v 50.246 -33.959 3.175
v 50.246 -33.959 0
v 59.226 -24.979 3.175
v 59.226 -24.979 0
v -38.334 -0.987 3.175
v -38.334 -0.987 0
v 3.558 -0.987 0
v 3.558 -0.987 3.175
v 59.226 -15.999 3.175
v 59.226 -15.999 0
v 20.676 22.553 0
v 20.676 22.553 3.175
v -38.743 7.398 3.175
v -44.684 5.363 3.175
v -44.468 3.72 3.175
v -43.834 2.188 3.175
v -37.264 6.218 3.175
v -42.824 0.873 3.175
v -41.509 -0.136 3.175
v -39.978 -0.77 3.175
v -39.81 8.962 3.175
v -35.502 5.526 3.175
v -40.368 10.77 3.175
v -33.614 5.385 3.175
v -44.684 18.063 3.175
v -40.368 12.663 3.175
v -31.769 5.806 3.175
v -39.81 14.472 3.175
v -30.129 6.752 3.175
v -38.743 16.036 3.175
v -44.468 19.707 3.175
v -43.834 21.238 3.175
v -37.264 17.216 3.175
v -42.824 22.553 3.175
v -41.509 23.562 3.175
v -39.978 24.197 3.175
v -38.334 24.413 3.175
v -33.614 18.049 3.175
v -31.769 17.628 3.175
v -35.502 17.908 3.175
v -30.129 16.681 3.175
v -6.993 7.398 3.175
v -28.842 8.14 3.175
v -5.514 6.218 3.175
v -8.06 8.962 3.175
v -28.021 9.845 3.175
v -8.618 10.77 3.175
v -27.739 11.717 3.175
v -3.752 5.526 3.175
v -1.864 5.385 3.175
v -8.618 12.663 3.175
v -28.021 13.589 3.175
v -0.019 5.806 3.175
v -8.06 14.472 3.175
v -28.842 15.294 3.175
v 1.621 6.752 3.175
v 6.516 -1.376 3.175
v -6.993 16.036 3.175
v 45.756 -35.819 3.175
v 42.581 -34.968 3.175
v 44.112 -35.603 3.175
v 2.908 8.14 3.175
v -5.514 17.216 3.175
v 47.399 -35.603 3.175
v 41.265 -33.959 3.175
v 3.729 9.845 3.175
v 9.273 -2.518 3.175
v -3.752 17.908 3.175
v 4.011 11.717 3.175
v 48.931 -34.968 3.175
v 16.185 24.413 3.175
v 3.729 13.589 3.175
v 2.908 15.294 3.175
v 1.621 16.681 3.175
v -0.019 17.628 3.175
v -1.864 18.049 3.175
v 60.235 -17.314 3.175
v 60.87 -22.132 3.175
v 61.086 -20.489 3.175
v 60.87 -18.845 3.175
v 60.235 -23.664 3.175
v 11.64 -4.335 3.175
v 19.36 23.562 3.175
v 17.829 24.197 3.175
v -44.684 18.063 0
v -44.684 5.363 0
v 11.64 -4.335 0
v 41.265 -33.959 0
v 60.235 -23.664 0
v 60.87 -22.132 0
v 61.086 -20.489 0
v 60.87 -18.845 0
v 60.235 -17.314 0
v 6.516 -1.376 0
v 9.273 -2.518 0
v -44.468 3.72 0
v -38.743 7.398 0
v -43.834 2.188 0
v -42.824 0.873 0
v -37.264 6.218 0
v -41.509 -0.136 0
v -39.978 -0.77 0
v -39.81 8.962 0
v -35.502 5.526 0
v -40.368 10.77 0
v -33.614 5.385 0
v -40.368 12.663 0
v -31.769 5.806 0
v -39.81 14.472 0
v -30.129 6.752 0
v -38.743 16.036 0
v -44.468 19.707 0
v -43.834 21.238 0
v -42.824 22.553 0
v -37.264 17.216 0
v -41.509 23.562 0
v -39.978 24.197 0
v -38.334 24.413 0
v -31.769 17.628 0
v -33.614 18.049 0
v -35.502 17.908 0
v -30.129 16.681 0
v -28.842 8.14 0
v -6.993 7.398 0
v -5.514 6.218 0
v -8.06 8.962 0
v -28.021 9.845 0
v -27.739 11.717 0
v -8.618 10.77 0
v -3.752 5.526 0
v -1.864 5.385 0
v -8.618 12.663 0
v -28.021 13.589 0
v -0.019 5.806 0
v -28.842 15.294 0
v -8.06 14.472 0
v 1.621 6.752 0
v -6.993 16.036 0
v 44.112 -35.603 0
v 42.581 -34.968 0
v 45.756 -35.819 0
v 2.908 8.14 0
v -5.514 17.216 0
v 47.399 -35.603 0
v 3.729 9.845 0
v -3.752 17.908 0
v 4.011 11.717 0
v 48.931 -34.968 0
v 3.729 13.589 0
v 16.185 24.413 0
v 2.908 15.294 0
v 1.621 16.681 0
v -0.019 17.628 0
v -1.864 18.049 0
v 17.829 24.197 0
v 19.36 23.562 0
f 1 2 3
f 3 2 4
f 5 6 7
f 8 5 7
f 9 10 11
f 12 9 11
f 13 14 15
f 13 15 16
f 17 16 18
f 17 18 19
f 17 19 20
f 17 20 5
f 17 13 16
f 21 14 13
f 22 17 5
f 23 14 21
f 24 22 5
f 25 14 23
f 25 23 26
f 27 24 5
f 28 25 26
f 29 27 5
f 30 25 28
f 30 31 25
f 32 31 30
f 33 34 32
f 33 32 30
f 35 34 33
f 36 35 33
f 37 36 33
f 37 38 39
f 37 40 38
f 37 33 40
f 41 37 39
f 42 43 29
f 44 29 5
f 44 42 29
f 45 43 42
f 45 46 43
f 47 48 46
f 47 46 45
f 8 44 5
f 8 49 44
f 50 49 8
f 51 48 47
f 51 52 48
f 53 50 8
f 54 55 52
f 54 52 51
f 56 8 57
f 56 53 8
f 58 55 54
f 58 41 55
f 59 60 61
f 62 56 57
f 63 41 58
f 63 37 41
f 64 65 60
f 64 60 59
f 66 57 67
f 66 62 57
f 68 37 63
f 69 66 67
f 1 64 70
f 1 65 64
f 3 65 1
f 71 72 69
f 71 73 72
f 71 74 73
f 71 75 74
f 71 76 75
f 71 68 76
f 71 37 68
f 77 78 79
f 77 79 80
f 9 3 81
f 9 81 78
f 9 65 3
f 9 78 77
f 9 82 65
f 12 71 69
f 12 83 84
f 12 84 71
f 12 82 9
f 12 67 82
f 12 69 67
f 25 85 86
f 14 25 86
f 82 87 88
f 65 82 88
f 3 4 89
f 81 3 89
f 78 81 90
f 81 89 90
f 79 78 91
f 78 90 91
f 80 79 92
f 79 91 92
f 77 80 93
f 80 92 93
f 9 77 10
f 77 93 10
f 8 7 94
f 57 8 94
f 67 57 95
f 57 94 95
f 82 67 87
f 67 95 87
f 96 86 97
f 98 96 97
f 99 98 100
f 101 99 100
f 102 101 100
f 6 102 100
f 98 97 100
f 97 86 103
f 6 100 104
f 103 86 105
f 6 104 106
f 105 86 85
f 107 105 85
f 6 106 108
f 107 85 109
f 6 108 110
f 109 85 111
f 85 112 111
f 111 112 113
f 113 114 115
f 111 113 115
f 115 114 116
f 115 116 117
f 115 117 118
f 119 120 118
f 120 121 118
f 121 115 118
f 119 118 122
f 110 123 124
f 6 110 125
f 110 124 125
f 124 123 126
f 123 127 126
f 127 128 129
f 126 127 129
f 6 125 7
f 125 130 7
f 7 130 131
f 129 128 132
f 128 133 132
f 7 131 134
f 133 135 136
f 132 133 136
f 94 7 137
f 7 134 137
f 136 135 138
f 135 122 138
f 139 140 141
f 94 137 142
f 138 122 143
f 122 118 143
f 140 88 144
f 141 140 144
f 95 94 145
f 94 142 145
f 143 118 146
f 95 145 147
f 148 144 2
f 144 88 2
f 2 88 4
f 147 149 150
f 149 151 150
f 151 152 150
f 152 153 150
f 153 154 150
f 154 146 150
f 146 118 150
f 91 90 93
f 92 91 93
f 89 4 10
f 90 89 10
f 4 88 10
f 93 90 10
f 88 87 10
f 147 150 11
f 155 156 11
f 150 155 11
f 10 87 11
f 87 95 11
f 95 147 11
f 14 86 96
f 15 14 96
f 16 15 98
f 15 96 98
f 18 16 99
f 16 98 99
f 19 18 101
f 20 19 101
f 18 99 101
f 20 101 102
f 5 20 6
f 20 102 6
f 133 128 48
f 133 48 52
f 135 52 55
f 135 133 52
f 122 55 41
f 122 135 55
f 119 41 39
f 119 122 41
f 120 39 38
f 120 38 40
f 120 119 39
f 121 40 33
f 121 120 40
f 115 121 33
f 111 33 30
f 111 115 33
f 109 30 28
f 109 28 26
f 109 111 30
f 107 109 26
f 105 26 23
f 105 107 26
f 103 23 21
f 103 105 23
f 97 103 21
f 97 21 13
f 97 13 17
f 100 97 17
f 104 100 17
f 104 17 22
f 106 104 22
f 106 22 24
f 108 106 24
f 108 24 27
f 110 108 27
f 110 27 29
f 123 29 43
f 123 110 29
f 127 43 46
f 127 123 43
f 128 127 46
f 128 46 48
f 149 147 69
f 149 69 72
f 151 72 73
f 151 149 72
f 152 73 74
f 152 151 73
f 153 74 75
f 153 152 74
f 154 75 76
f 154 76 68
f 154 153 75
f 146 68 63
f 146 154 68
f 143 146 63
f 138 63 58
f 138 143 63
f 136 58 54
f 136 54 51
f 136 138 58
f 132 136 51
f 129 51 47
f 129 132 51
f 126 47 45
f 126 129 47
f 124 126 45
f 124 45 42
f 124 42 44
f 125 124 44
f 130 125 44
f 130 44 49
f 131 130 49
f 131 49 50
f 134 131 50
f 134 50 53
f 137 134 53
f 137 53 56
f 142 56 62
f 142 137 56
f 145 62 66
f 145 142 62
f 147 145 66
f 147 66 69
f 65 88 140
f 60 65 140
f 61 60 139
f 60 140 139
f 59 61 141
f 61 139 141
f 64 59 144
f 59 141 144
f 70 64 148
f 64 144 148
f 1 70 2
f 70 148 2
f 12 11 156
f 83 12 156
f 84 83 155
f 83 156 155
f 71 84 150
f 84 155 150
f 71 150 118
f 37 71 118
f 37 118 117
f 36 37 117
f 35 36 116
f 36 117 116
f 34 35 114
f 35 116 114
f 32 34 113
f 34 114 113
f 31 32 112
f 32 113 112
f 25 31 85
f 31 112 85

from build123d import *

# Parameters (mm, degrees)
F0_R     = 6.35
F1_DEPTH = 3.175


with BuildPart() as f1:
    # F0 (on Top) → F1 (new body)
    with BuildSketch(Plane.XY):
        with BuildLine():
            Line((50.245686, -33.959337), (59.226047, -24.978976))
            ThreePointArc((59.226047, -24.978976), (61.085919, -20.48891), (59.226135, -15.998808))
            Line((59.226135, -15.998808), (20.675575, 22.553266))
            ThreePointArc((20.675575, 22.553266), (18.615456, 23.929837), (16.185359, 24.413226))
            Line((16.185359, 24.413226), (-38.334312, 24.413226))
            ThreePointArc((-38.334312, 24.413226), (-42.82444, 22.553354), (-44.684312, 18.063226))
            Line((-44.684312, 18.063226), (-44.684312, 11.716822))
            Line((-44.684312, 11.716822), (-44.684312, 5.363226))
            ThreePointArc((-44.684312, 5.363226), (-42.82444, 0.873098), (-38.334312, -0.986774))
            Line((-38.334312, -0.986774), (3.558176, -0.986774))
            ThreePointArc((3.558176, -0.986774), (7.932227, -1.856822), (11.640375, -4.334512))
            Line((11.640375, -4.334512), (41.265447, -33.959355))
            ThreePointArc((41.265447, -33.959355), (45.75557, -35.819209), (50.245686, -33.959337))
        make_face()
        with Locations((-34.088506, 11.716822)):
            Circle(F0_R, mode=Mode.SUBTRACT)
        with Locations((-2.338506, 11.716822)):
            Circle(F0_R, mode=Mode.SUBTRACT)
    extrude(amount=F1_DEPTH)


solid = f1.part
